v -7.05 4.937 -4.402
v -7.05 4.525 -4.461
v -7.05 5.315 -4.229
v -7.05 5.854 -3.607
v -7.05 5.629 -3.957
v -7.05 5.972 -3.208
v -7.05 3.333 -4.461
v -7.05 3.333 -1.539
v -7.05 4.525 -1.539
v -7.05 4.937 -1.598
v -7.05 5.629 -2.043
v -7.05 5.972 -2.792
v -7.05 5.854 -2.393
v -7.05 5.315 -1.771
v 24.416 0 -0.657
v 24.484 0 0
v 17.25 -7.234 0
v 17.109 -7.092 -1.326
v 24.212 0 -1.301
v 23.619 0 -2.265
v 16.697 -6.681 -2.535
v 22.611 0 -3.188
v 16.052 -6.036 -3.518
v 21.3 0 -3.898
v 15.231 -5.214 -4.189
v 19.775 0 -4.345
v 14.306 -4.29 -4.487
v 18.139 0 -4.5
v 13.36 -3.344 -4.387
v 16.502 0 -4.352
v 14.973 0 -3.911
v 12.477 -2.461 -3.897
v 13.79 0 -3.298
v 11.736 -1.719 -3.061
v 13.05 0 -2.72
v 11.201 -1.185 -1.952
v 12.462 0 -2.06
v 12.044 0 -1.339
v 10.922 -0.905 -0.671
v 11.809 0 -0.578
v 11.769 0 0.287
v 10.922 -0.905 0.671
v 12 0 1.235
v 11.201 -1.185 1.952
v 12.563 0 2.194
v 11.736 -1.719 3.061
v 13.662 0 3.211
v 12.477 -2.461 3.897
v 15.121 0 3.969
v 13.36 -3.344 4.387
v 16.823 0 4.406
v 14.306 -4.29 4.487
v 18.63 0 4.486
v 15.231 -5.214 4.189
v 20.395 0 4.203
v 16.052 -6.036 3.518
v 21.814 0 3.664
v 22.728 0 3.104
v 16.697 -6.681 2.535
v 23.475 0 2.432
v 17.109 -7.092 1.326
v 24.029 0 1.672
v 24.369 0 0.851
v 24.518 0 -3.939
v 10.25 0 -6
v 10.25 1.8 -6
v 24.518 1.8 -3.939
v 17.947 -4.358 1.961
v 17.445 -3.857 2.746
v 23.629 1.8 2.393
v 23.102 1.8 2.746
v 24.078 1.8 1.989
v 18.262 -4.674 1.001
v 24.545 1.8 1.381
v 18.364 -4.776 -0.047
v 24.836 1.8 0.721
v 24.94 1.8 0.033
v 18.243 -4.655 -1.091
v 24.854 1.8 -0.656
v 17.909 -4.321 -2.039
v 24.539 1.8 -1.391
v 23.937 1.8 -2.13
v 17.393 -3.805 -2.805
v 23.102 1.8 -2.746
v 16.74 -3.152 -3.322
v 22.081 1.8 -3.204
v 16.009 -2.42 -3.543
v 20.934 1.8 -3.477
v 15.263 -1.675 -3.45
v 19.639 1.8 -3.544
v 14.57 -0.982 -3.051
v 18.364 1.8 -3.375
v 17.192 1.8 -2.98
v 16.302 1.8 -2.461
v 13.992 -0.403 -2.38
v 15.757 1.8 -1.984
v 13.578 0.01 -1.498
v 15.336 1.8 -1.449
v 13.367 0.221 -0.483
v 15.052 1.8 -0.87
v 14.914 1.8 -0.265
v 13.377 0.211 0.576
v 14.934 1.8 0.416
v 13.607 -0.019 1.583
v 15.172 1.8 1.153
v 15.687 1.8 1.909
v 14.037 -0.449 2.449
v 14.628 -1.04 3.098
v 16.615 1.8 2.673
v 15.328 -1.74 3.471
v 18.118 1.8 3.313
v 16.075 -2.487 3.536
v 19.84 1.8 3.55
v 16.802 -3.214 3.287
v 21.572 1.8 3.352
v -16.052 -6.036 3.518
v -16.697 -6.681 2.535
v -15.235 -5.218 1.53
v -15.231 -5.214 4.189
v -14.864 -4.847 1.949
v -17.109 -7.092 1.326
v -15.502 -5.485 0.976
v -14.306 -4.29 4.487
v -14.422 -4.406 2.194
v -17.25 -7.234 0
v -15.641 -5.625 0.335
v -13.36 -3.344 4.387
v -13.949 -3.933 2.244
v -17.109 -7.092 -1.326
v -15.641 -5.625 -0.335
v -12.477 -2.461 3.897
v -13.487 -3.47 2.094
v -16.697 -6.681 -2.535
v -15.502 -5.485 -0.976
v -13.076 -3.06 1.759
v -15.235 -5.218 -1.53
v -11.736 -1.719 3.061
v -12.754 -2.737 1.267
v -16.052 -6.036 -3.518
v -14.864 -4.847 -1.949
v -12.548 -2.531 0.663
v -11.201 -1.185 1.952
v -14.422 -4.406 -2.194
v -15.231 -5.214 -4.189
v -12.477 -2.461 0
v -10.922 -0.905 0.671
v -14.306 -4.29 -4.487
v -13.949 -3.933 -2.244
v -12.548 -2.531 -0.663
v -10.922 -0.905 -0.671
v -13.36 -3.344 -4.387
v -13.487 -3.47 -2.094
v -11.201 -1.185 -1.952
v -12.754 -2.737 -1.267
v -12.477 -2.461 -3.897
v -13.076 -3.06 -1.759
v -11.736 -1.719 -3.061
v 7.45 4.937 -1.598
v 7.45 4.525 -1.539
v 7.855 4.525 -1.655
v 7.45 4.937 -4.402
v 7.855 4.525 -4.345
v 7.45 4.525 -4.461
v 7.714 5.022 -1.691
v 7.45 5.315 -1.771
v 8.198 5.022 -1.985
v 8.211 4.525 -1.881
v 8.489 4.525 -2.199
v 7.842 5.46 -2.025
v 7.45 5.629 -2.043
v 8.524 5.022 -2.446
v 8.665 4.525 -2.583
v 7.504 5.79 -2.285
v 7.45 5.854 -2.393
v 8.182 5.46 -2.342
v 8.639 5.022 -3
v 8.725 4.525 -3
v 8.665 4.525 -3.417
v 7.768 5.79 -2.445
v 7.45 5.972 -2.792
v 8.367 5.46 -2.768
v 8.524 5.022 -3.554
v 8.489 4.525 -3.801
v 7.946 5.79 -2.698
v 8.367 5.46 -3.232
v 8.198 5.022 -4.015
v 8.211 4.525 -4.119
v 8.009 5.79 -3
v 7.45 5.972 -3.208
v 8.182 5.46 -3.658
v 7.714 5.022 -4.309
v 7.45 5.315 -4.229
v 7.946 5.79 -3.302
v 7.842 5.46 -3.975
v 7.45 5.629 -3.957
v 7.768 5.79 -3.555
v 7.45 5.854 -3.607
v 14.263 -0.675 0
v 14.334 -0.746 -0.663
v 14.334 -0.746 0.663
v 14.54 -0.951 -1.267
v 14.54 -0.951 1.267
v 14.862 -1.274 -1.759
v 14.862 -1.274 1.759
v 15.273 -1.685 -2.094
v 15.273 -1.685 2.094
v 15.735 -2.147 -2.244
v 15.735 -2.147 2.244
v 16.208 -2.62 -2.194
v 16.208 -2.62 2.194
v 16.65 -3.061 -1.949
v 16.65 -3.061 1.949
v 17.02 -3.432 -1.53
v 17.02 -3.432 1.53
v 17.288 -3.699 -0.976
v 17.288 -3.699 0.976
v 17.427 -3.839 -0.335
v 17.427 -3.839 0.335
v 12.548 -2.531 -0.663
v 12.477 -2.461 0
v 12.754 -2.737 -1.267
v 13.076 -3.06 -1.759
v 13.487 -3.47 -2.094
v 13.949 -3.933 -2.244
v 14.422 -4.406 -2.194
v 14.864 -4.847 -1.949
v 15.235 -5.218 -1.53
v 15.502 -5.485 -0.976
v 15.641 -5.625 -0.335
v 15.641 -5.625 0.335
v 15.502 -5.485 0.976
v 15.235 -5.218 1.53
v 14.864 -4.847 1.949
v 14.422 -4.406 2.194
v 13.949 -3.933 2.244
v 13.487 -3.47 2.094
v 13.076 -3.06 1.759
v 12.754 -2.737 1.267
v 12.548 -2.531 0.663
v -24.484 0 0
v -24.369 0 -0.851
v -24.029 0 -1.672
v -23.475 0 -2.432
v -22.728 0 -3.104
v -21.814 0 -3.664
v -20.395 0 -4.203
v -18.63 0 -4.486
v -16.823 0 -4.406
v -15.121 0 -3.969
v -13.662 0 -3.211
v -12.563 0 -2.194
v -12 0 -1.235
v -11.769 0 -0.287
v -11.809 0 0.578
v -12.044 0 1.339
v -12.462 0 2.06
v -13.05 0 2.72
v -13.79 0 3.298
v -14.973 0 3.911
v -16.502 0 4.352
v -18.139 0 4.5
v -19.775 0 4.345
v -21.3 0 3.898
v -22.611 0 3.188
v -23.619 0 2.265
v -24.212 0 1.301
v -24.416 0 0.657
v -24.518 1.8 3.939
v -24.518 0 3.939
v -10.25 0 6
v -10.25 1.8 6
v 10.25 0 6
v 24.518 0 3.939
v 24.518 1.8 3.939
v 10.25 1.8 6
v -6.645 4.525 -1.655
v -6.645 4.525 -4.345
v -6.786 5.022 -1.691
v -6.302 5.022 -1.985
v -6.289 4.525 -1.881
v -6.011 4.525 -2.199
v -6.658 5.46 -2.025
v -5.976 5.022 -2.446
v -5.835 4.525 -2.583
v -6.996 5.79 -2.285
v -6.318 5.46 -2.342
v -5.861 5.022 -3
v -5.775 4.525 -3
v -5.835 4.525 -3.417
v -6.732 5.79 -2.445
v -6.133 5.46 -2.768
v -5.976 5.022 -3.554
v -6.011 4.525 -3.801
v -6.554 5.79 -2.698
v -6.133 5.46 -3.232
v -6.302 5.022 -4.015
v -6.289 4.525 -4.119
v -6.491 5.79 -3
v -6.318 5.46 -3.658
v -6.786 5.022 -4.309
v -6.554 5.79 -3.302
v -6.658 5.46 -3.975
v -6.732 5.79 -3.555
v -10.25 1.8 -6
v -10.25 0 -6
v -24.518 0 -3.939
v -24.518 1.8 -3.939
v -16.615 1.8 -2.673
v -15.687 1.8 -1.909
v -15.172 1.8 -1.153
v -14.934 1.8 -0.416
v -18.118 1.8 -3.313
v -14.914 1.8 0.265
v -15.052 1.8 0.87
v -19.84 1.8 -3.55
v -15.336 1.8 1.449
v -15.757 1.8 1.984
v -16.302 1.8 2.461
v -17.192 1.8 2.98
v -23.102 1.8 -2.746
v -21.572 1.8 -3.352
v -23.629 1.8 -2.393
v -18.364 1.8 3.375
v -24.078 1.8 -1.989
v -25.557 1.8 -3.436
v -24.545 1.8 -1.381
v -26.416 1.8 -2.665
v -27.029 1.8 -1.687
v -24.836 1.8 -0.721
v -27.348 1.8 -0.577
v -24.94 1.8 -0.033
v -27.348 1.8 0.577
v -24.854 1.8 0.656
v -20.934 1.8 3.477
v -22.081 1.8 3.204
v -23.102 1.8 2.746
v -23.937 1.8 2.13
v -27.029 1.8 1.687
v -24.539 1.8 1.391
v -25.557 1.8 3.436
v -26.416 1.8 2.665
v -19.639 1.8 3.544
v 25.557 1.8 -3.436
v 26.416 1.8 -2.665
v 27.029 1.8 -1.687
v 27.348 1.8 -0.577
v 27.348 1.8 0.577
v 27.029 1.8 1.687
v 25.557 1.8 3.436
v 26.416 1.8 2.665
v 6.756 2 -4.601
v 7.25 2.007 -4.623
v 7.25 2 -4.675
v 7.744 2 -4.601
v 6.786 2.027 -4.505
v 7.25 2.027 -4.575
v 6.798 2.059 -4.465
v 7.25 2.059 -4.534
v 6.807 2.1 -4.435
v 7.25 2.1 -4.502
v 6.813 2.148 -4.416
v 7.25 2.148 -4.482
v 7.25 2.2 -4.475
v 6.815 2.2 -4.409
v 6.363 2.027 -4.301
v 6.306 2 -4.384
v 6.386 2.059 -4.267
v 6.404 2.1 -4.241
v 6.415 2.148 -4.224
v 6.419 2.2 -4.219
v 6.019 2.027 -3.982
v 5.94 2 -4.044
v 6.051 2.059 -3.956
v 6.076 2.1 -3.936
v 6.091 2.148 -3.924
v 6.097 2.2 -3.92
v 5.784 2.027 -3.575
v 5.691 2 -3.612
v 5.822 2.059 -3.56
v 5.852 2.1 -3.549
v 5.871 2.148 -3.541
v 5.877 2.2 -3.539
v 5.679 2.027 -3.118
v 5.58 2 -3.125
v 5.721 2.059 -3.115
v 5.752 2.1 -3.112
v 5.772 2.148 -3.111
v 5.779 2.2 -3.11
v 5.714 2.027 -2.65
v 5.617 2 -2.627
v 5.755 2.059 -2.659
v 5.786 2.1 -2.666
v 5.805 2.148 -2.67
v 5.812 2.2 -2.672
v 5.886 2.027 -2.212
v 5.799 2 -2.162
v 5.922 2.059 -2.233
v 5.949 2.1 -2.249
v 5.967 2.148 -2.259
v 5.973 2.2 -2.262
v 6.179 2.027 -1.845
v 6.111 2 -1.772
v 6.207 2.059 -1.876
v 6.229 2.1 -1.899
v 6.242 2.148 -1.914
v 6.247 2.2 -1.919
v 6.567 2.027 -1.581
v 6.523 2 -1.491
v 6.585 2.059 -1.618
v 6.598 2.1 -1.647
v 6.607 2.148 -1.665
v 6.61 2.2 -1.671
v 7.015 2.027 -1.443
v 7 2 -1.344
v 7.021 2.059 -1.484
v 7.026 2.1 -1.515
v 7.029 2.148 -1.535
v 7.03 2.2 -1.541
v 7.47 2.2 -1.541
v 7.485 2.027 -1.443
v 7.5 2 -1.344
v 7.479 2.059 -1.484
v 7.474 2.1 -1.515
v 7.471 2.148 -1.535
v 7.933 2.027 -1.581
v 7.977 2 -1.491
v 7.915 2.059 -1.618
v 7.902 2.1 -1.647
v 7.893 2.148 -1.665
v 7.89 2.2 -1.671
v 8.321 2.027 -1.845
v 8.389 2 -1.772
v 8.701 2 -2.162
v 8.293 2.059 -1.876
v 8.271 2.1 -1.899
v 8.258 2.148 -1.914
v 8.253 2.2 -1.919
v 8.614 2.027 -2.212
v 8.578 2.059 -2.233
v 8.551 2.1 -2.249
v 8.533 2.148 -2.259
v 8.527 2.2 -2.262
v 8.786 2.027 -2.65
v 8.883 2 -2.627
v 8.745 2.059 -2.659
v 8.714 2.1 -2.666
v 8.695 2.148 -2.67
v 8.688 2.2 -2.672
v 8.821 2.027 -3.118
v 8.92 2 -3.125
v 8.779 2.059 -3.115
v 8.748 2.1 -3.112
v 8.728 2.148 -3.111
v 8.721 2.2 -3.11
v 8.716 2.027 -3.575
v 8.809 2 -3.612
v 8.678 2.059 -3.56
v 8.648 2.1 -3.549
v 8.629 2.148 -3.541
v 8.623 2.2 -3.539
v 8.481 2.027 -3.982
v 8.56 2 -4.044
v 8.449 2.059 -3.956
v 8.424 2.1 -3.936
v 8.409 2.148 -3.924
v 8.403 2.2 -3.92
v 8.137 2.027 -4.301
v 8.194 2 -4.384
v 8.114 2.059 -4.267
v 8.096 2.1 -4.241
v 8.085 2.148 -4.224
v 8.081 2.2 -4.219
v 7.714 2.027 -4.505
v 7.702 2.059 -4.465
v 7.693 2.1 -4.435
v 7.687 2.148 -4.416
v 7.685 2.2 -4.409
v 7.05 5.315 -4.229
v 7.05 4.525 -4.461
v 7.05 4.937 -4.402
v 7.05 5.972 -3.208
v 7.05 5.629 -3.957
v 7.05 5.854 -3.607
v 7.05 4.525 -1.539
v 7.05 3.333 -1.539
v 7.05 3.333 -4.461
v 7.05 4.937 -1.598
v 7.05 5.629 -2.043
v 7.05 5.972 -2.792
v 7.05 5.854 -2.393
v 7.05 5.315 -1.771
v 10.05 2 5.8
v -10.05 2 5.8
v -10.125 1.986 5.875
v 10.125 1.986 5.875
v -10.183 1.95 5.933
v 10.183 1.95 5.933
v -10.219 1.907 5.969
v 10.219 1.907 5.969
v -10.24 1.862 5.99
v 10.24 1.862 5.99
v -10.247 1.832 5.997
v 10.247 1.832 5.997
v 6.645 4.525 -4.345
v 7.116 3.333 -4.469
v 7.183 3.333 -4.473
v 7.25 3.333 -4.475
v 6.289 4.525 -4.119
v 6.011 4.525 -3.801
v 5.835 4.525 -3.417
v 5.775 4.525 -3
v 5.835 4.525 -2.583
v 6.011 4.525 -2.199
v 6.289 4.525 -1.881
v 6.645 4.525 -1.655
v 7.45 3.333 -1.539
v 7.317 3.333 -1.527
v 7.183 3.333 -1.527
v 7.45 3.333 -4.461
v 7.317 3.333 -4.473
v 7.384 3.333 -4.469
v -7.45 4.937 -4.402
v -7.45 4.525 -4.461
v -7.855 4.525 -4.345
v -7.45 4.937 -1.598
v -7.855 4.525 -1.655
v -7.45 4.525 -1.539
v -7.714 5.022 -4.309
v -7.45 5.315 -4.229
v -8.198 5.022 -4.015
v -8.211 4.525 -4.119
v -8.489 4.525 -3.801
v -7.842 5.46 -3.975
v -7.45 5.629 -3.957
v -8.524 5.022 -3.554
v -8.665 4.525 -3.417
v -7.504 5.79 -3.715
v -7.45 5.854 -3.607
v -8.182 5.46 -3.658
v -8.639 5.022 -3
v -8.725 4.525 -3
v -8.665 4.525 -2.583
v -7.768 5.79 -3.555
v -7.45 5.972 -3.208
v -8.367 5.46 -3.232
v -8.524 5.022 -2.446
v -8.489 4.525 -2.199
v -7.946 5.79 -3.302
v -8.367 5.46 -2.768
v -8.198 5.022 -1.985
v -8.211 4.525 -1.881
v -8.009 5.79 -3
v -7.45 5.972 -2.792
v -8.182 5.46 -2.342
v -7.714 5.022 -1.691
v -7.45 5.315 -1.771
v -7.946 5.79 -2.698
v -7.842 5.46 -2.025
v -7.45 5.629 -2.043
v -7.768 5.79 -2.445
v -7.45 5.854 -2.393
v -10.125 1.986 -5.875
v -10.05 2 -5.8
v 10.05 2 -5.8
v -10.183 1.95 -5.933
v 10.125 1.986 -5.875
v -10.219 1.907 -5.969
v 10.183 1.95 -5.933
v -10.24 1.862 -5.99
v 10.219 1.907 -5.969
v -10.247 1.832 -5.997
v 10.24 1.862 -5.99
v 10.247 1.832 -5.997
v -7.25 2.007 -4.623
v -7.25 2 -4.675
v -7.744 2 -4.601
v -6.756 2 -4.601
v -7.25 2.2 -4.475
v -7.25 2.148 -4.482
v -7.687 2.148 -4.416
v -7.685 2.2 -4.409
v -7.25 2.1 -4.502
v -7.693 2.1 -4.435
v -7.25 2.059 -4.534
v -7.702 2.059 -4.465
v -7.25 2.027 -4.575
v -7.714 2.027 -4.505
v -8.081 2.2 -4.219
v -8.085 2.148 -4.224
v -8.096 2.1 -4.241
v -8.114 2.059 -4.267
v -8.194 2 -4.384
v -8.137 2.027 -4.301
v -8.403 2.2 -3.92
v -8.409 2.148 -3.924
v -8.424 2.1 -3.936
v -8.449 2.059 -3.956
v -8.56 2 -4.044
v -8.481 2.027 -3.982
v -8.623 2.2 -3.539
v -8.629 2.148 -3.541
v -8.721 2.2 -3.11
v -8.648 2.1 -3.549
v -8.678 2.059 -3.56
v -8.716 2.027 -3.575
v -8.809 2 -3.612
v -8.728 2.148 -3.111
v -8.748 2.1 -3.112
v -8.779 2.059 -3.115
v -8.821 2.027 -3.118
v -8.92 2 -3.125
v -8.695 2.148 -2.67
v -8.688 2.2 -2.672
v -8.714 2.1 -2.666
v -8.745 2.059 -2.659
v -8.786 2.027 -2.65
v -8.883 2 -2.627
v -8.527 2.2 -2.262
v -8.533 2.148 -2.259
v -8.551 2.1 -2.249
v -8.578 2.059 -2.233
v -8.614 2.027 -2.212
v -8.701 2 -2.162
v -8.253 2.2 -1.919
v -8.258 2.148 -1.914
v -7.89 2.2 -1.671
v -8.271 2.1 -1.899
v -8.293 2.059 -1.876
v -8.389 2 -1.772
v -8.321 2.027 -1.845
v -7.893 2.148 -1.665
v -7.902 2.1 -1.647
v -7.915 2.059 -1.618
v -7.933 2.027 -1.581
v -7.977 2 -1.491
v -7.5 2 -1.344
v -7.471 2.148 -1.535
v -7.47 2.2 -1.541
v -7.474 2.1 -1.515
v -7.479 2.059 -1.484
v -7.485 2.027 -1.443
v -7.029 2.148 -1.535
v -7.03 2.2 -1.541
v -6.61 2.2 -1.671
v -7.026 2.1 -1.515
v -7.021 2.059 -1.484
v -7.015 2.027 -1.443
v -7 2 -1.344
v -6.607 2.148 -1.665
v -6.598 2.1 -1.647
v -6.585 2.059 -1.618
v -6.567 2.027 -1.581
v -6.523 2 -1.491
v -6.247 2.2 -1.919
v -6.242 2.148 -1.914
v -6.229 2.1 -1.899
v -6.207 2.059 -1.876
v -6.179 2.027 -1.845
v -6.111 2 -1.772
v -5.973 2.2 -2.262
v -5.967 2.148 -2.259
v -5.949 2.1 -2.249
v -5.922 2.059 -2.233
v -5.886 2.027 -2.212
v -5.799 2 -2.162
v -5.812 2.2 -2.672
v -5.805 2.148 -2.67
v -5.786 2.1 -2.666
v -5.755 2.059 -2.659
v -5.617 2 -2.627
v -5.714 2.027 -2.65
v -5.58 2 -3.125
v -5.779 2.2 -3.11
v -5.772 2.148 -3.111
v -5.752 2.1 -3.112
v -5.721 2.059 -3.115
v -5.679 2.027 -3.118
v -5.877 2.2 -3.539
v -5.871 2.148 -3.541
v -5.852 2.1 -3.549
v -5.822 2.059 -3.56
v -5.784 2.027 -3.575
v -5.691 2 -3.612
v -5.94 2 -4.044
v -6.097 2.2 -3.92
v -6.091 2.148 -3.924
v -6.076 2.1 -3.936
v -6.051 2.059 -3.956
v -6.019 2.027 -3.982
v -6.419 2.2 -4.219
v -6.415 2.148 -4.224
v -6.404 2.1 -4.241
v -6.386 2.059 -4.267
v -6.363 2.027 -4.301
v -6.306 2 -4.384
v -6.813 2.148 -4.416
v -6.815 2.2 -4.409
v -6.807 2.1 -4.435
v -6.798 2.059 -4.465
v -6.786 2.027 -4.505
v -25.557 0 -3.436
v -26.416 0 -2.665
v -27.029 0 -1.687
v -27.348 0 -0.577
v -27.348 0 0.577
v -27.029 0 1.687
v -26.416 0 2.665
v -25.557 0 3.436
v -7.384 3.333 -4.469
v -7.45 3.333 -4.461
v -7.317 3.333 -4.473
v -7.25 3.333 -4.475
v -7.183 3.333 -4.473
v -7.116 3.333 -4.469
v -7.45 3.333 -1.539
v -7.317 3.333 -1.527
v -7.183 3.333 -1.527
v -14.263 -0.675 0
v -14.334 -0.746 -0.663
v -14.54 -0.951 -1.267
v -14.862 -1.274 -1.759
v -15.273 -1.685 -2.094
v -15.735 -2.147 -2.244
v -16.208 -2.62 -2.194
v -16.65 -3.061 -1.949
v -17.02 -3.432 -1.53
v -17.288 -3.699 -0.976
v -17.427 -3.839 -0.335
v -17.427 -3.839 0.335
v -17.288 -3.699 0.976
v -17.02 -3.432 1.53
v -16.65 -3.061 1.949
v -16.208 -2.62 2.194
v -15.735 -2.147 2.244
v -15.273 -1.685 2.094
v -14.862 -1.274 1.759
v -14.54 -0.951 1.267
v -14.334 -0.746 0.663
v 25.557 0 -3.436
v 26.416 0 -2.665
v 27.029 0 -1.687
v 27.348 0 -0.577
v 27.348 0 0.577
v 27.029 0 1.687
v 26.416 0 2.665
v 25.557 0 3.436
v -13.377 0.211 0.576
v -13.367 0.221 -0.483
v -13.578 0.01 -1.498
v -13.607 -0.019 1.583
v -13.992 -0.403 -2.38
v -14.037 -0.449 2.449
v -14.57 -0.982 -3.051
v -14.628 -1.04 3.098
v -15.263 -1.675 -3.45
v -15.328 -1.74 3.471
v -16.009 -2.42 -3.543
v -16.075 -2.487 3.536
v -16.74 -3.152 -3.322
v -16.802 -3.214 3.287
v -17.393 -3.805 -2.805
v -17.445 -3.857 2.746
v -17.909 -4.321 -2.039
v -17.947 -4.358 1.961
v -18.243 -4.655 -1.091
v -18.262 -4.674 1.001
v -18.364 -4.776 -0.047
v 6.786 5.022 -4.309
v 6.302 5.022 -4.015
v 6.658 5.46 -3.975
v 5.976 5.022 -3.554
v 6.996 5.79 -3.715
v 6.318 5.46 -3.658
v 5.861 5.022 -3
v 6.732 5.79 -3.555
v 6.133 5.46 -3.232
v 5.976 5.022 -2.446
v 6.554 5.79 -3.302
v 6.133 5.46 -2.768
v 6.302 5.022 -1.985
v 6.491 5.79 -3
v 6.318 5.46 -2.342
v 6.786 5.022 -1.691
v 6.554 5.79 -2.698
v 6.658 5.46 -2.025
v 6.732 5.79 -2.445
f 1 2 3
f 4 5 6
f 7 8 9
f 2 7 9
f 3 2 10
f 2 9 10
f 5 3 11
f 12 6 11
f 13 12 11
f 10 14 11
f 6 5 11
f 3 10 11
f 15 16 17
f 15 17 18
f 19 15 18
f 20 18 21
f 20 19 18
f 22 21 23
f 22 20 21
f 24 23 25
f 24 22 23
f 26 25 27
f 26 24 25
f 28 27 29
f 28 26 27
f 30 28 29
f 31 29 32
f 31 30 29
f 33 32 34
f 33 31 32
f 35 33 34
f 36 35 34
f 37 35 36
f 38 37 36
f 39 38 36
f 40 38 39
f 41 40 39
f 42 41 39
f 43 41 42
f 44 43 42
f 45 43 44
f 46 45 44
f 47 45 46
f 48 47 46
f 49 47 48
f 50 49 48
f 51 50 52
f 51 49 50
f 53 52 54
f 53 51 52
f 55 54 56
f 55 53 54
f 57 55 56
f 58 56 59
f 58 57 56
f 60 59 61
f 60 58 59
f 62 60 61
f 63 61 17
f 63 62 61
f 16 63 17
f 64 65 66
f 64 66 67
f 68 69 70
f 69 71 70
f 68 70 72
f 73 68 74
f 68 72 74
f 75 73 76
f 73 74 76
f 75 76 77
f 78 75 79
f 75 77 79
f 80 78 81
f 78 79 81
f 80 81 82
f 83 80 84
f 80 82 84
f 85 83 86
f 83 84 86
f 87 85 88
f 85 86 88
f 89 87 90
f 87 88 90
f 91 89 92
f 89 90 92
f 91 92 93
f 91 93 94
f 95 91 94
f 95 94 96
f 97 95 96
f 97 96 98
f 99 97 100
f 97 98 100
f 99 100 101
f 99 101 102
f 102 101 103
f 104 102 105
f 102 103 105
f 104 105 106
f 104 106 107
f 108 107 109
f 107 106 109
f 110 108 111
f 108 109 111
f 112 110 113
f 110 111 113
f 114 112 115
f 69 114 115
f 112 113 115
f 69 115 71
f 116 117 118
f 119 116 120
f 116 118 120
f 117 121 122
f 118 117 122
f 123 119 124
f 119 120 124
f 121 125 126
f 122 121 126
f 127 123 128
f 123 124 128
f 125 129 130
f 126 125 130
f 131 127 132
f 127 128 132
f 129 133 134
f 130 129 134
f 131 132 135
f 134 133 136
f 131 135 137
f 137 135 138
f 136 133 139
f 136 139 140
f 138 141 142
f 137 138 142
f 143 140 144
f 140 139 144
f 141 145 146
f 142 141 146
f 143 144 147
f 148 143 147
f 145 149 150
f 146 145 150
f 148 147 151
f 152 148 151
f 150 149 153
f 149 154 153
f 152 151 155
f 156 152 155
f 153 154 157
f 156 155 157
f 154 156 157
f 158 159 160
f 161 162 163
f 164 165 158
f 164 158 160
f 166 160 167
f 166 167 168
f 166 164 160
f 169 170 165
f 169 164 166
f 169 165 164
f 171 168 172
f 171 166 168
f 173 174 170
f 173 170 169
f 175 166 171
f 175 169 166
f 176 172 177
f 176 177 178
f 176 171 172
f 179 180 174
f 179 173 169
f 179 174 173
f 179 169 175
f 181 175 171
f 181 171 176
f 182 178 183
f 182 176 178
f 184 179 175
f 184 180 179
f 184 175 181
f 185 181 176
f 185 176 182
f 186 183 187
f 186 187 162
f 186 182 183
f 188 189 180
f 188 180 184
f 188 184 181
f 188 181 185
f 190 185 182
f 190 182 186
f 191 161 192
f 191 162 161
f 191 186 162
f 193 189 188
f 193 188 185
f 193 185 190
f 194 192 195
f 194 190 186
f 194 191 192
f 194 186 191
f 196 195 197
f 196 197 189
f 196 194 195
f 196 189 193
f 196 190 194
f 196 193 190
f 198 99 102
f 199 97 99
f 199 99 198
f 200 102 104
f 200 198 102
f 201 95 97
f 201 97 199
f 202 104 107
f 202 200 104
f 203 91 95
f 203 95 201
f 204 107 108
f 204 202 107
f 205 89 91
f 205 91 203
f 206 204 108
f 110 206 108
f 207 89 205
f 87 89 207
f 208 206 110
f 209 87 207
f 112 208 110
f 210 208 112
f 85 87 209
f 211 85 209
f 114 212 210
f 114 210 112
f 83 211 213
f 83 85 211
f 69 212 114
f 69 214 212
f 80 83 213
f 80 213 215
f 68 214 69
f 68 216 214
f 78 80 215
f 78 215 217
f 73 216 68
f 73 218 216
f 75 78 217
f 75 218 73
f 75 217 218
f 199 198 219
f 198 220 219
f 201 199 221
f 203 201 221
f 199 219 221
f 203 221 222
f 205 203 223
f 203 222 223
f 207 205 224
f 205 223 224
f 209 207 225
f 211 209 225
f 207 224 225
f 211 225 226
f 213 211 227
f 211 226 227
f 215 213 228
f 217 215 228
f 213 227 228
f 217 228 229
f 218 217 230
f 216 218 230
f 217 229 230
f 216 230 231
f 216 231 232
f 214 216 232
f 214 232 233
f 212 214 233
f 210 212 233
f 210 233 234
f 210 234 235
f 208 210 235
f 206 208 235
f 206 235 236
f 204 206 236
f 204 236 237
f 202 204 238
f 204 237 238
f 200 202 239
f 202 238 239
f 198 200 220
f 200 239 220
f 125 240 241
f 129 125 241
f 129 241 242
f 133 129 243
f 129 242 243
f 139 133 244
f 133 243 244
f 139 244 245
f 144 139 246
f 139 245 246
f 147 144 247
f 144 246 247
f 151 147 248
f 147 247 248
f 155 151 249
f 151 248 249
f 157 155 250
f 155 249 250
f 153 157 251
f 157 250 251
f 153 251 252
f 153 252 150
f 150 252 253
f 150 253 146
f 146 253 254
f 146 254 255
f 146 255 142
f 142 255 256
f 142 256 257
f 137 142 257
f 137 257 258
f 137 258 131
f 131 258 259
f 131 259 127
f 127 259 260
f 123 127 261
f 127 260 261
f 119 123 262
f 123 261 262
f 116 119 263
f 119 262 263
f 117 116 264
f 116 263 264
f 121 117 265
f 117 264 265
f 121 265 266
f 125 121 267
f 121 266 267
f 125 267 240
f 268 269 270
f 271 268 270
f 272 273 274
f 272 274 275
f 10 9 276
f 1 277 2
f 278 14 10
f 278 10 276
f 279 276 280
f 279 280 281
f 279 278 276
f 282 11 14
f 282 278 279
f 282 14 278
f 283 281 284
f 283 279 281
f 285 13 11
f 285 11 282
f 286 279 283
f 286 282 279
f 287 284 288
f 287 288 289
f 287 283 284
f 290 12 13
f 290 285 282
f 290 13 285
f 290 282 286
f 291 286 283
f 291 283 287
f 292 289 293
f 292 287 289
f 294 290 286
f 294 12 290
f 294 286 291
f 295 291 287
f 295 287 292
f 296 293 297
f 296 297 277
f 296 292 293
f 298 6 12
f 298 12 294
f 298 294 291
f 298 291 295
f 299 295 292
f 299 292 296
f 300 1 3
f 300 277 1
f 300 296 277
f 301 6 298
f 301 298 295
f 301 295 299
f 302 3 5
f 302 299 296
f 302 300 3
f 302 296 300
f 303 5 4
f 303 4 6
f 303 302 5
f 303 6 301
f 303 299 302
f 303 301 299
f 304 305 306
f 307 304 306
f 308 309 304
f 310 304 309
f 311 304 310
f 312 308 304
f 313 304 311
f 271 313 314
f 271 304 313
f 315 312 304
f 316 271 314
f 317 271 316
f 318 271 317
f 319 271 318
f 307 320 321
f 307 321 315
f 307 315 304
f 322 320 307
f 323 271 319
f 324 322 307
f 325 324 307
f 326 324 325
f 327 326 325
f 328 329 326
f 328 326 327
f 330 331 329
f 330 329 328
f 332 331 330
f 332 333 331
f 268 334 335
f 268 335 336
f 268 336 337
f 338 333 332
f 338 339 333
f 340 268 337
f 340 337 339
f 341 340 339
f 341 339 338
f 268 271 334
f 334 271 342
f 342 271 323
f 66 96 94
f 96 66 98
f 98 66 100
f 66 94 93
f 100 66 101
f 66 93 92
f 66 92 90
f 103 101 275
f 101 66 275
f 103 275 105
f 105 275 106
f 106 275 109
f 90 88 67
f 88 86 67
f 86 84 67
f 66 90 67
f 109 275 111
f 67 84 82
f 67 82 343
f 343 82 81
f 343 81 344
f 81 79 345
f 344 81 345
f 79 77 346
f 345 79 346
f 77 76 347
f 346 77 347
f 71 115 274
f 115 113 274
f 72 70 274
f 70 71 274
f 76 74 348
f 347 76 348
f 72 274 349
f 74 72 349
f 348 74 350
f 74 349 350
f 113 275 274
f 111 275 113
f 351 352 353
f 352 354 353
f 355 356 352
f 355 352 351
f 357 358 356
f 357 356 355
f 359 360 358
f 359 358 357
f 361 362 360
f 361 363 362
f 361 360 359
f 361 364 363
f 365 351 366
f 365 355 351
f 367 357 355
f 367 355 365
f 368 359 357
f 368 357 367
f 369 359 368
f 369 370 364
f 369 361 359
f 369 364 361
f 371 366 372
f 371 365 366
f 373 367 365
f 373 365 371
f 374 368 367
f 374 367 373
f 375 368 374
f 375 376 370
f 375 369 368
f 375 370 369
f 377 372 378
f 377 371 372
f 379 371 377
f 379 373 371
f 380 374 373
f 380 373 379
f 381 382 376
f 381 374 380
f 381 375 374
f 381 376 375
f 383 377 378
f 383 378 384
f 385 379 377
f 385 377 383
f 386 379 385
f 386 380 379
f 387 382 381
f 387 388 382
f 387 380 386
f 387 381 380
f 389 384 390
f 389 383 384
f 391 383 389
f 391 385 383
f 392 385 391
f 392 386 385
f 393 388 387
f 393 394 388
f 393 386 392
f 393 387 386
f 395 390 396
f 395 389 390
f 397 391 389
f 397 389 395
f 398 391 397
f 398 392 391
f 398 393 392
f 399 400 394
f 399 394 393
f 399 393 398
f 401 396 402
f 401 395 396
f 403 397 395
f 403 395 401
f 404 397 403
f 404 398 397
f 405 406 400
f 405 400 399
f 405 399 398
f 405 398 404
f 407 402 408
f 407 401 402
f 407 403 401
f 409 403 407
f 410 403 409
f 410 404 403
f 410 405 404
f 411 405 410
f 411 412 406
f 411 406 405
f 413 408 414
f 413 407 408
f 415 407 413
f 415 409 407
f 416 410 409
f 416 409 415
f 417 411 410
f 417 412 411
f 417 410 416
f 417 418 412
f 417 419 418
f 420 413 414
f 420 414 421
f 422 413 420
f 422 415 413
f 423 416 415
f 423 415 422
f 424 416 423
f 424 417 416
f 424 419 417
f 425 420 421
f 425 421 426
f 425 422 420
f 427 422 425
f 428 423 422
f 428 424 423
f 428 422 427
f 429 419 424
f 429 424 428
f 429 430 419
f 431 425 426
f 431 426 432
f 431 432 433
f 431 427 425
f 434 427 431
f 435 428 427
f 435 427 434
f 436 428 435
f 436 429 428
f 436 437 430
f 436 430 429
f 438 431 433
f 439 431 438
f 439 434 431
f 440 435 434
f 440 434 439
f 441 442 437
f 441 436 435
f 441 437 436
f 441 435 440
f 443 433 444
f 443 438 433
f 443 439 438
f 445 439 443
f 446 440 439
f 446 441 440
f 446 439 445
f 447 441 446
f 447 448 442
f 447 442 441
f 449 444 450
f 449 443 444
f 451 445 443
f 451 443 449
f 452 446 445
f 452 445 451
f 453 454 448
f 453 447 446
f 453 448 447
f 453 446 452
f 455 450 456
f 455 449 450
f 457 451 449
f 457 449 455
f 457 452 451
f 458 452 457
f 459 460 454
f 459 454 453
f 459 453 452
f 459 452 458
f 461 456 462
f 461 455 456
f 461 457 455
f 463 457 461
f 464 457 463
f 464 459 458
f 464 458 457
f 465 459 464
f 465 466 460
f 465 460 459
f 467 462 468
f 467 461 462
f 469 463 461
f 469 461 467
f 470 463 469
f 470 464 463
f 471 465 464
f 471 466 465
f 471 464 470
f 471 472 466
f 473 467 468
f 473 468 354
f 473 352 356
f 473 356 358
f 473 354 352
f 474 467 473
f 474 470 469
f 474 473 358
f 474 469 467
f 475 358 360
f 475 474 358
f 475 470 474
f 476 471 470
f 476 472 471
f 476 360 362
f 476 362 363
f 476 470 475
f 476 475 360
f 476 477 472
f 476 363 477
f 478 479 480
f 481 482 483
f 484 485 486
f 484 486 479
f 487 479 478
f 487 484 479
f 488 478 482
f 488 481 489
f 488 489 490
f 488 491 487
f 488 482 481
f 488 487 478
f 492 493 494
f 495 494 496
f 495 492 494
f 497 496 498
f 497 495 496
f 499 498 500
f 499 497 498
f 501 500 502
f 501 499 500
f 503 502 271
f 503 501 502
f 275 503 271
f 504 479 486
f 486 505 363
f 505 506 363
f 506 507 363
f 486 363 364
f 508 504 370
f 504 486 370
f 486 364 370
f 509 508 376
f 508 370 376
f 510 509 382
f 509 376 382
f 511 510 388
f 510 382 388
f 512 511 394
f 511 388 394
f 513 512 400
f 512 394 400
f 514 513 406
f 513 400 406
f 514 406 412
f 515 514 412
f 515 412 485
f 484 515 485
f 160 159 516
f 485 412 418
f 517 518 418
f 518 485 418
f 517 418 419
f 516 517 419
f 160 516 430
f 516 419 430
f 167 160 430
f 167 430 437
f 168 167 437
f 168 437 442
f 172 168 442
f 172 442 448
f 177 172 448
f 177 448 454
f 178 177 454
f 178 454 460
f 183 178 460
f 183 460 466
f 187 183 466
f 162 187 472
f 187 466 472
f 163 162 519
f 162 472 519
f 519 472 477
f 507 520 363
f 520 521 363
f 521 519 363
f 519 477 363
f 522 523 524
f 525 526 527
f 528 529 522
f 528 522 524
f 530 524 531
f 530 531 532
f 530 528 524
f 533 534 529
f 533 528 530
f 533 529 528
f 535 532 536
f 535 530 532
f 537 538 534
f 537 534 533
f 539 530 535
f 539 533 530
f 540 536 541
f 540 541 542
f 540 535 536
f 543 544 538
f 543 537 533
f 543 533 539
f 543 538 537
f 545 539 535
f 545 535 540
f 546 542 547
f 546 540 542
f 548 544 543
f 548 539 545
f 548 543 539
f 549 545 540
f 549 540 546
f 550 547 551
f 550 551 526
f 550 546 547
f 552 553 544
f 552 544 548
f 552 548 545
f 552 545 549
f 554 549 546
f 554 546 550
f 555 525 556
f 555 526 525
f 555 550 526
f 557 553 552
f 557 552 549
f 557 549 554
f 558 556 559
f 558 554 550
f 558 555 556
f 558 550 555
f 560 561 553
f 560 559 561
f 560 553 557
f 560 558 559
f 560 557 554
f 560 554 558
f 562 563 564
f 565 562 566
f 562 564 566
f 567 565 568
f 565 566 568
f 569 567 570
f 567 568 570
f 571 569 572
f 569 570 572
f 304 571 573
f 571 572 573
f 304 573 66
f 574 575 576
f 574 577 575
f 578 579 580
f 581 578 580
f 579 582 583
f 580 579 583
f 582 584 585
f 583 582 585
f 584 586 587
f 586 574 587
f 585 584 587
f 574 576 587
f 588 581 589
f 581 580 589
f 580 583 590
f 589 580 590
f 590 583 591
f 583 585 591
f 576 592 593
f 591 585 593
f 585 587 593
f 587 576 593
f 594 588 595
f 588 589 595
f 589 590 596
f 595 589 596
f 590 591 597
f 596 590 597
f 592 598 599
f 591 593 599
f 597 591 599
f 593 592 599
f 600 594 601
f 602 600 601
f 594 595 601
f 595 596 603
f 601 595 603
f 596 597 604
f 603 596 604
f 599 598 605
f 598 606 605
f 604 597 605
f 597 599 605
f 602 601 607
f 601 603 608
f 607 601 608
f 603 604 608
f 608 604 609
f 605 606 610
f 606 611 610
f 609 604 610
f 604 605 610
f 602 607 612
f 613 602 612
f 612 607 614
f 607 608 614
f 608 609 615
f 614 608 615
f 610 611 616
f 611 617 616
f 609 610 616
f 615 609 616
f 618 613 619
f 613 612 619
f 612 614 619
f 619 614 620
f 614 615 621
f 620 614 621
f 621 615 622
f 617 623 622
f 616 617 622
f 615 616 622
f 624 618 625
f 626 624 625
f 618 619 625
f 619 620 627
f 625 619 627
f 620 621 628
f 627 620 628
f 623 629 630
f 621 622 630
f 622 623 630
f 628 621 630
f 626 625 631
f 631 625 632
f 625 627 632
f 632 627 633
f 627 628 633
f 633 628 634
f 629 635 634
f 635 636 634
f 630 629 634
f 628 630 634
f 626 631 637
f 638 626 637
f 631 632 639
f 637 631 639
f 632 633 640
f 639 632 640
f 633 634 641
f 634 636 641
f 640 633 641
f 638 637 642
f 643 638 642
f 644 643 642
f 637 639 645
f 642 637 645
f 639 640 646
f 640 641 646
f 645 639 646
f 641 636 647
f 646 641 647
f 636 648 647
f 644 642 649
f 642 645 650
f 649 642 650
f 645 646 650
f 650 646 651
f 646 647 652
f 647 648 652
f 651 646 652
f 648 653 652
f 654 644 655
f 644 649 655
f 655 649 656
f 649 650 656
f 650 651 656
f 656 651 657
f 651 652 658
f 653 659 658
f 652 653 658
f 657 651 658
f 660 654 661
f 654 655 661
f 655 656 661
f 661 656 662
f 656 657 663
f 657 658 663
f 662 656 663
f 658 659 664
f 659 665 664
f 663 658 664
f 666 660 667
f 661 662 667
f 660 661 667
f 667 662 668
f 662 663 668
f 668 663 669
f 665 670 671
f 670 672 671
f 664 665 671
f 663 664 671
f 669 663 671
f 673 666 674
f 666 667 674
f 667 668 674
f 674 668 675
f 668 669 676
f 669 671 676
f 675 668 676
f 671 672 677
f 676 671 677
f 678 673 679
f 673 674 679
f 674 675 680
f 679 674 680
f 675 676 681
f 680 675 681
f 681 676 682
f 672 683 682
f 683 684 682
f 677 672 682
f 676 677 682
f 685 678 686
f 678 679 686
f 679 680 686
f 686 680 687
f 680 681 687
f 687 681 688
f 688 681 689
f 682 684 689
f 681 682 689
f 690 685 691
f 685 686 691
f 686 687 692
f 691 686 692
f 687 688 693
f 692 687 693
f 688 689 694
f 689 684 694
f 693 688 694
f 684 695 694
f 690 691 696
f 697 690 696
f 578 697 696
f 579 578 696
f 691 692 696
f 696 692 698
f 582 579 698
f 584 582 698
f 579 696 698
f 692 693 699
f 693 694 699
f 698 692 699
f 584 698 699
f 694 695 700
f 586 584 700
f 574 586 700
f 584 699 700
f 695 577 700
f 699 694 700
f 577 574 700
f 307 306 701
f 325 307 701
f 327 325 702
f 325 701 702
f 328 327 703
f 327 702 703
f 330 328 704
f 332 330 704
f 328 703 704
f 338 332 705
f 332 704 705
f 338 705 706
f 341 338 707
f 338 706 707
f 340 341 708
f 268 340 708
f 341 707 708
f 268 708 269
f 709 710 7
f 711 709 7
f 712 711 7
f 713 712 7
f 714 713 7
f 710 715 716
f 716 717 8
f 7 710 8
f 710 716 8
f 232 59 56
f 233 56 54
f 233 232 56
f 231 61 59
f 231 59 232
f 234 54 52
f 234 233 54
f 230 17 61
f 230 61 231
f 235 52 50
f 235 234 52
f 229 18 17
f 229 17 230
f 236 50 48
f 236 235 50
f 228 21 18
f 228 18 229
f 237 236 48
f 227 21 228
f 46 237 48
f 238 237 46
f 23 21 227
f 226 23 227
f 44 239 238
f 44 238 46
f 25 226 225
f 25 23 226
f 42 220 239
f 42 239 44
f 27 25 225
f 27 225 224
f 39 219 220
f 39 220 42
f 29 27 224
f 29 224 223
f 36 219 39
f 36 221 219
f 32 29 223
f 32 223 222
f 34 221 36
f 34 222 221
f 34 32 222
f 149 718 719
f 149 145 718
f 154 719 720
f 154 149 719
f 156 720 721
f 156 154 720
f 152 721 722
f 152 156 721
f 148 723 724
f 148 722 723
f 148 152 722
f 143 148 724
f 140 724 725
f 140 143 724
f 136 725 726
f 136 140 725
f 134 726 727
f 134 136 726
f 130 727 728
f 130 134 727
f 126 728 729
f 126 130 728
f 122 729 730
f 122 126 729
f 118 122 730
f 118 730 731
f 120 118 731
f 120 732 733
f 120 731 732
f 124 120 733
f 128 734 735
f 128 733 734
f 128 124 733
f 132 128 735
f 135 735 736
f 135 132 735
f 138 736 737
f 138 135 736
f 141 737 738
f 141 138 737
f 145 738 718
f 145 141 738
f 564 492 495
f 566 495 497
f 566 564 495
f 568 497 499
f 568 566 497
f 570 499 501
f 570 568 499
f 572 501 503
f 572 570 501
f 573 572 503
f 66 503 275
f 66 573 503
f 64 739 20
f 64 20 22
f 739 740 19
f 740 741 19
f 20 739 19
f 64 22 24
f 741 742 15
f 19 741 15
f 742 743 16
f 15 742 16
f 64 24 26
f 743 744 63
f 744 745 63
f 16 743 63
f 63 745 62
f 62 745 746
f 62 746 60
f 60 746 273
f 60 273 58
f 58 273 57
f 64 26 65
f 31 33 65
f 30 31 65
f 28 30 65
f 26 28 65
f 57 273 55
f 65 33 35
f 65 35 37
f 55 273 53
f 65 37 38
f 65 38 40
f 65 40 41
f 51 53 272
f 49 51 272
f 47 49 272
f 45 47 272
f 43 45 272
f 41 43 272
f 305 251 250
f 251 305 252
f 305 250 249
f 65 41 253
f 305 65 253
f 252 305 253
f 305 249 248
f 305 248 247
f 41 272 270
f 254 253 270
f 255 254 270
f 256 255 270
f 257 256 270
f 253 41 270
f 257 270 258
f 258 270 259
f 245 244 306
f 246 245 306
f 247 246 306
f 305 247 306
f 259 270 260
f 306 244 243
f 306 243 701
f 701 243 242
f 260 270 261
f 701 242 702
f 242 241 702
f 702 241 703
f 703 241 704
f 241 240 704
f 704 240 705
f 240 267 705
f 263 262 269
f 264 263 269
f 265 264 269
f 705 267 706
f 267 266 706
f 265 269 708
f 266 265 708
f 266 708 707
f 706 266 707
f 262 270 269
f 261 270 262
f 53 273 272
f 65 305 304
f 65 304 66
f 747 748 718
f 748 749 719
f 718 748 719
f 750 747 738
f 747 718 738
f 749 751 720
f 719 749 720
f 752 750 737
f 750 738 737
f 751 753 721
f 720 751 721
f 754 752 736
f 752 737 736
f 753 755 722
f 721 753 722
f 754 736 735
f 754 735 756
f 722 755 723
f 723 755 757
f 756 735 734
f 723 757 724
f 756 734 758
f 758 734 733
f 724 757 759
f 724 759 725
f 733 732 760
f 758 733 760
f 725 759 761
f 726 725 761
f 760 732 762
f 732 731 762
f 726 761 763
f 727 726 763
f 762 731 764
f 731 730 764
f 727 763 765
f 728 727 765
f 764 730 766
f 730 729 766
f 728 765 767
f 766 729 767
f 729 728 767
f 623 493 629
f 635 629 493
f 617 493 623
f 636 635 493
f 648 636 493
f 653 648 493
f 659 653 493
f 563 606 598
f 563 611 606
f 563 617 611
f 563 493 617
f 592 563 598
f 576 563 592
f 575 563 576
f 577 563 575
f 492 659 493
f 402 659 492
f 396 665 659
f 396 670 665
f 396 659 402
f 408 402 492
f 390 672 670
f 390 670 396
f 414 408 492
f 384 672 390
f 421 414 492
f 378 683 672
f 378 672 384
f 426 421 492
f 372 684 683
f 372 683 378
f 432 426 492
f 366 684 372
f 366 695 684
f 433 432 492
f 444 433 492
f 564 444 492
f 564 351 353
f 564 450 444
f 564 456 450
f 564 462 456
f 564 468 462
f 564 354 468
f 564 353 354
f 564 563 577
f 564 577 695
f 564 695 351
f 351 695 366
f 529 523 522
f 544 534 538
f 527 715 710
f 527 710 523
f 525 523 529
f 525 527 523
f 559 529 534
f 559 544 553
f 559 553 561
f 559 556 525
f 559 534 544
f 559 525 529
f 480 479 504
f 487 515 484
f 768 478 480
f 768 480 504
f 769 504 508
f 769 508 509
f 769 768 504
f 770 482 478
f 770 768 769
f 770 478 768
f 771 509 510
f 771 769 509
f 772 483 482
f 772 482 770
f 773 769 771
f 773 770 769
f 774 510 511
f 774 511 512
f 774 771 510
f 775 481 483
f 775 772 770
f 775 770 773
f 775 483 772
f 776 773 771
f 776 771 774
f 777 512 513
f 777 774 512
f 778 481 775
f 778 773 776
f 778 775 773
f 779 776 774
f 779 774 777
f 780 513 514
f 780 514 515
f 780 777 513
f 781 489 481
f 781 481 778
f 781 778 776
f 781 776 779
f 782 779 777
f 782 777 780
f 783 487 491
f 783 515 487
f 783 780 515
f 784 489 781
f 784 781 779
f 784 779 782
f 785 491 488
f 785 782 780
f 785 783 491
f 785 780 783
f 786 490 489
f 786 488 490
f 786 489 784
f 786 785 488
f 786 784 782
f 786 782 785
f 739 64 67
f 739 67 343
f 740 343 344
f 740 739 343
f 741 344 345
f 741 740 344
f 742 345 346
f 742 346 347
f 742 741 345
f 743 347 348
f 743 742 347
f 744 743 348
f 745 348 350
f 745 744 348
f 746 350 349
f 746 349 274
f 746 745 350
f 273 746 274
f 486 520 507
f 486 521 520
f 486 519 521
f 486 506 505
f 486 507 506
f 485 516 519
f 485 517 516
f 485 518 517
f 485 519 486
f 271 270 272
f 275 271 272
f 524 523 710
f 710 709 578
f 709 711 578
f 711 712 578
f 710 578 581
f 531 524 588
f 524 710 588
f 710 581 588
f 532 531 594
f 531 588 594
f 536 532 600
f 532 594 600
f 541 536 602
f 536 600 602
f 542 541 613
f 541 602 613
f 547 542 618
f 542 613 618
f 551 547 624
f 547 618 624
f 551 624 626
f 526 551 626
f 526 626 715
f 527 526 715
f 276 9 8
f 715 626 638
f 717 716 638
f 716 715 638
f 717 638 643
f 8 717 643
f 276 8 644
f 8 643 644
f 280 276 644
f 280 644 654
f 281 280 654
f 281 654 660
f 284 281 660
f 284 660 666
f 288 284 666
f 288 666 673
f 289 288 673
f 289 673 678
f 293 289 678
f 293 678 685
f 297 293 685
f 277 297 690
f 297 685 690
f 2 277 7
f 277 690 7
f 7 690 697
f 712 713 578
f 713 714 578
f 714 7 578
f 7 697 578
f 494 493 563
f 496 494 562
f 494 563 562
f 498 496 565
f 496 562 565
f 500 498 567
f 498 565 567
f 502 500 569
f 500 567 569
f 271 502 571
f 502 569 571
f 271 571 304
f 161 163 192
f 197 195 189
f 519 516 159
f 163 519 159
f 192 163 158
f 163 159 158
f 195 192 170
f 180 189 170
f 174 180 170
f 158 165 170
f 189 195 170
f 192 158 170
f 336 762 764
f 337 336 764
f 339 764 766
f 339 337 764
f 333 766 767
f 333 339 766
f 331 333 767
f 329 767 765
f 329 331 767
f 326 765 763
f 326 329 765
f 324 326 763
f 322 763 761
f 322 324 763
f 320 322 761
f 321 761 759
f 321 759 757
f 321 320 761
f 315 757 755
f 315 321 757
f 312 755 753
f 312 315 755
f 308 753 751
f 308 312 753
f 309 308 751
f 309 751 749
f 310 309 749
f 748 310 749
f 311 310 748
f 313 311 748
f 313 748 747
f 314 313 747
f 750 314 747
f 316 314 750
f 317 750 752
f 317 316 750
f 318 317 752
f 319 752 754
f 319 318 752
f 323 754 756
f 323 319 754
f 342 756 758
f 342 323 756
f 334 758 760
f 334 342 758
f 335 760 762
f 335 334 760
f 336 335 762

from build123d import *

# Parameters (mm, degrees)
SKETCH1_W           = 20.5
SKETCH1_H           = 12
BOSS_EXTRUDE2_DEPTH = 2
SKETCH2_R           = 1.475
BOSS_EXTRUDE3_DEPTH = 4
FILLET1_R           = 1.475
FILLET2_R           = 0.2
BOSS_EXTRUDE4_DEPTH = 1.8
SKETCH6_R           = 2.25
CUT_EXTRUDE1_DEPTH  = 36.148325783
SKETCH7_W           = 18.806014856
SKETCH7_H           = 6.487022836
CUT_EXTRUDE2_DEPTH  = 29.955928605
SKETCH14_R          = 3.55
CUT_EXTRUDE4_DEPTH  = 8
CUT_EXTRUDE5_START  = -6
CUT_EXTRUDE5_DEPTH  = 6
SKETCH15_W          = 0.4
SKETCH15_H          = 2.666666667
CUT_EXTRUDE6_DEPTH  = 31.764359271


with BuildPart() as part:
    # Sketch1 → Boss-Extrude2 (new body)
    with BuildSketch(Plane(origin=(0, 0, 0), x_dir=(1, 0, 0), z_dir=(0, 1, 0))):
        Rectangle(SKETCH1_W, SKETCH1_H)
    extrude(amount=BOSS_EXTRUDE2_DEPTH)

    # Sketch2 → Boss-Extrude3 (add)
    with BuildSketch(Plane(origin=(0, 2, 0), x_dir=(1, 0, 0), z_dir=(0, 1, 0))):
        with Locations((-7.25, 3)):
            Circle(SKETCH2_R)
        with Locations((7.25, 3)):
            Circle(SKETCH2_R)
    extrude(amount=BOSS_EXTRUDE3_DEPTH)

    # Fillet1
    fillet1_edges = [part.edges().sort_by_distance(p)[0] for p in [
        (5.775, 6, -3),
        (-8.725, 6, -3),
    ]]
    fillet(fillet1_edges, radius=FILLET1_R)

    # Fillet2
    fillet2_edges = [part.edges().sort_by_distance(p)[0] for p in [
        (0, 2, 6),
        (-10.25, 2, 0),
        (0, 2, -6),
        (10.25, 2, 0),
        (-8.725, 2, -3),
        (5.775, 2, -3),
    ]]
    fillet(fillet2_edges, radius=FILLET2_R)

    # Sketch3 → Boss-Extrude4 (add)
    with BuildSketch(Plane.XZ):
        with BuildLine():
            Line((10.25, -6), (24.517982167, -3.939264487))
            ThreePointArc((24.517982167, -3.939264487), (27.388306837, 0), (24.517982167, 3.939264487))
            Line((24.517982167, 3.939264487), (10.25, 6))
            Line((10.25, 6), (10.25, 0))
            Line((10.25, 0), (10.25, -6))
        make_face()
    boss_extrude4 = extrude(amount=-BOSS_EXTRUDE4_DEPTH)

    # Mirror1: Boss-Extrude4 across plane
    add(boss_extrude4.mirror(Plane(origin=(0, 0, 0), x_dir=(0, 0, 1), z_dir=(1, 0, 0))))

    # Sketch4 → Revolve2 (revolve)
    with BuildSketch(Plane.XY):
        Polygon((14.068278144, -4.051721856), (17.250258659, -7.233702372), (24.483961031, 0), (18.12, 0), align=None)
    revolve2 = revolve(axis=Axis((18.12, 0, 0), (-0.7071067811865459, -0.7071067811865492, 0)))

    # Mirror2: Revolve2 across plane
    add(revolve2.mirror(Plane(origin=(0, 0, 0), x_dir=(0, 0, 1), z_dir=(1, 0, 0))))

    # Sketch6 → Cut-Extrude1 (cut, symmetric)
    with BuildSketch(Plane(origin=(5.008278144, 5.008278144, 0), x_dir=(0, 0, 1), z_dir=(-0.707106781186546, -0.707106781186549, 0))):
        with Locations((0, -12.812774875)):
            Circle(SKETCH6_R)
    cut_extrude1 = extrude(amount=CUT_EXTRUDE1_DEPTH, both=True, mode=Mode.SUBTRACT)

    # Mirror3: Cut-Extrude1 across plane
    add(cut_extrude1.mirror(Plane(origin=(0, 0, 0), x_dir=(0, 0, 1), z_dir=(1, 0, 0))), mode=Mode.SUBTRACT)

    # Sketch7 → Cut-Extrude2 (cut, symmetric)
    with BuildSketch(Plane.XY):
        with Locations((19.653007428, 5.043511418)):
            Rectangle(SKETCH7_W, SKETCH7_H)
    cut_extrude2 = extrude(amount=CUT_EXTRUDE2_DEPTH, both=True, mode=Mode.SUBTRACT)

    # Mirror4: Cut-Extrude2 across plane
    add(cut_extrude2.mirror(Plane(origin=(0, 0, 0), x_dir=(0, 0, 1), z_dir=(1, 0, 0))), mode=Mode.SUBTRACT)

    # Sketch14 → Cut-Extrude4 (cut)
    with BuildSketch(Plane(origin=(-12.450990258, 12.450990258, 0), x_dir=(0, 0, -1), z_dir=(0.7071067811865438, -0.7071067811865512, 0))):
        with Locations((0, -12.812774875)):
            Circle(SKETCH14_R)
    cut_extrude4 = extrude(amount=CUT_EXTRUDE4_DEPTH, mode=Mode.SUBTRACT)

    # Sketch14 → Cut-Extrude5 (cut)
    with BuildSketch(Plane(origin=(-12.450990258, 12.450990258, 0), x_dir=(0, 0, -1), z_dir=(0.7071067811865438, -0.7071067811865512, 0)).offset(CUT_EXTRUDE5_START)):
        with Locations((0, -12.812774875)):
            Circle(SKETCH14_R)
    cut_extrude5 = extrude(amount=CUT_EXTRUDE5_DEPTH, mode=Mode.SUBTRACT)

    # Mirror5: Cut-Extrude4, Cut-Extrude5 across plane
    add(cut_extrude4.mirror(Plane(origin=(0, 0, 0), x_dir=(0, 0, 1), z_dir=(1, 0, 0))), mode=Mode.SUBTRACT)
    add(cut_extrude5.mirror(Plane(origin=(0, 0, 0), x_dir=(0, 0, 1), z_dir=(1, 0, 0))), mode=Mode.SUBTRACT)

    # Sketch15 → Cut-Extrude6 (cut, symmetric)
    with BuildSketch(Plane.XY.offset(6)):
        with Locations((-7.25, 4.666666667)):
            Rectangle(SKETCH15_W, SKETCH15_H)
    cut_extrude6 = extrude(amount=CUT_EXTRUDE6_DEPTH, both=True, mode=Mode.SUBTRACT)

    # Mirror6: Cut-Extrude6 across plane
    add(cut_extrude6.mirror(Plane(origin=(0, 0, 0), x_dir=(0, 0, 1), z_dir=(1, 0, 0))), mode=Mode.SUBTRACT)


solid = part.part
